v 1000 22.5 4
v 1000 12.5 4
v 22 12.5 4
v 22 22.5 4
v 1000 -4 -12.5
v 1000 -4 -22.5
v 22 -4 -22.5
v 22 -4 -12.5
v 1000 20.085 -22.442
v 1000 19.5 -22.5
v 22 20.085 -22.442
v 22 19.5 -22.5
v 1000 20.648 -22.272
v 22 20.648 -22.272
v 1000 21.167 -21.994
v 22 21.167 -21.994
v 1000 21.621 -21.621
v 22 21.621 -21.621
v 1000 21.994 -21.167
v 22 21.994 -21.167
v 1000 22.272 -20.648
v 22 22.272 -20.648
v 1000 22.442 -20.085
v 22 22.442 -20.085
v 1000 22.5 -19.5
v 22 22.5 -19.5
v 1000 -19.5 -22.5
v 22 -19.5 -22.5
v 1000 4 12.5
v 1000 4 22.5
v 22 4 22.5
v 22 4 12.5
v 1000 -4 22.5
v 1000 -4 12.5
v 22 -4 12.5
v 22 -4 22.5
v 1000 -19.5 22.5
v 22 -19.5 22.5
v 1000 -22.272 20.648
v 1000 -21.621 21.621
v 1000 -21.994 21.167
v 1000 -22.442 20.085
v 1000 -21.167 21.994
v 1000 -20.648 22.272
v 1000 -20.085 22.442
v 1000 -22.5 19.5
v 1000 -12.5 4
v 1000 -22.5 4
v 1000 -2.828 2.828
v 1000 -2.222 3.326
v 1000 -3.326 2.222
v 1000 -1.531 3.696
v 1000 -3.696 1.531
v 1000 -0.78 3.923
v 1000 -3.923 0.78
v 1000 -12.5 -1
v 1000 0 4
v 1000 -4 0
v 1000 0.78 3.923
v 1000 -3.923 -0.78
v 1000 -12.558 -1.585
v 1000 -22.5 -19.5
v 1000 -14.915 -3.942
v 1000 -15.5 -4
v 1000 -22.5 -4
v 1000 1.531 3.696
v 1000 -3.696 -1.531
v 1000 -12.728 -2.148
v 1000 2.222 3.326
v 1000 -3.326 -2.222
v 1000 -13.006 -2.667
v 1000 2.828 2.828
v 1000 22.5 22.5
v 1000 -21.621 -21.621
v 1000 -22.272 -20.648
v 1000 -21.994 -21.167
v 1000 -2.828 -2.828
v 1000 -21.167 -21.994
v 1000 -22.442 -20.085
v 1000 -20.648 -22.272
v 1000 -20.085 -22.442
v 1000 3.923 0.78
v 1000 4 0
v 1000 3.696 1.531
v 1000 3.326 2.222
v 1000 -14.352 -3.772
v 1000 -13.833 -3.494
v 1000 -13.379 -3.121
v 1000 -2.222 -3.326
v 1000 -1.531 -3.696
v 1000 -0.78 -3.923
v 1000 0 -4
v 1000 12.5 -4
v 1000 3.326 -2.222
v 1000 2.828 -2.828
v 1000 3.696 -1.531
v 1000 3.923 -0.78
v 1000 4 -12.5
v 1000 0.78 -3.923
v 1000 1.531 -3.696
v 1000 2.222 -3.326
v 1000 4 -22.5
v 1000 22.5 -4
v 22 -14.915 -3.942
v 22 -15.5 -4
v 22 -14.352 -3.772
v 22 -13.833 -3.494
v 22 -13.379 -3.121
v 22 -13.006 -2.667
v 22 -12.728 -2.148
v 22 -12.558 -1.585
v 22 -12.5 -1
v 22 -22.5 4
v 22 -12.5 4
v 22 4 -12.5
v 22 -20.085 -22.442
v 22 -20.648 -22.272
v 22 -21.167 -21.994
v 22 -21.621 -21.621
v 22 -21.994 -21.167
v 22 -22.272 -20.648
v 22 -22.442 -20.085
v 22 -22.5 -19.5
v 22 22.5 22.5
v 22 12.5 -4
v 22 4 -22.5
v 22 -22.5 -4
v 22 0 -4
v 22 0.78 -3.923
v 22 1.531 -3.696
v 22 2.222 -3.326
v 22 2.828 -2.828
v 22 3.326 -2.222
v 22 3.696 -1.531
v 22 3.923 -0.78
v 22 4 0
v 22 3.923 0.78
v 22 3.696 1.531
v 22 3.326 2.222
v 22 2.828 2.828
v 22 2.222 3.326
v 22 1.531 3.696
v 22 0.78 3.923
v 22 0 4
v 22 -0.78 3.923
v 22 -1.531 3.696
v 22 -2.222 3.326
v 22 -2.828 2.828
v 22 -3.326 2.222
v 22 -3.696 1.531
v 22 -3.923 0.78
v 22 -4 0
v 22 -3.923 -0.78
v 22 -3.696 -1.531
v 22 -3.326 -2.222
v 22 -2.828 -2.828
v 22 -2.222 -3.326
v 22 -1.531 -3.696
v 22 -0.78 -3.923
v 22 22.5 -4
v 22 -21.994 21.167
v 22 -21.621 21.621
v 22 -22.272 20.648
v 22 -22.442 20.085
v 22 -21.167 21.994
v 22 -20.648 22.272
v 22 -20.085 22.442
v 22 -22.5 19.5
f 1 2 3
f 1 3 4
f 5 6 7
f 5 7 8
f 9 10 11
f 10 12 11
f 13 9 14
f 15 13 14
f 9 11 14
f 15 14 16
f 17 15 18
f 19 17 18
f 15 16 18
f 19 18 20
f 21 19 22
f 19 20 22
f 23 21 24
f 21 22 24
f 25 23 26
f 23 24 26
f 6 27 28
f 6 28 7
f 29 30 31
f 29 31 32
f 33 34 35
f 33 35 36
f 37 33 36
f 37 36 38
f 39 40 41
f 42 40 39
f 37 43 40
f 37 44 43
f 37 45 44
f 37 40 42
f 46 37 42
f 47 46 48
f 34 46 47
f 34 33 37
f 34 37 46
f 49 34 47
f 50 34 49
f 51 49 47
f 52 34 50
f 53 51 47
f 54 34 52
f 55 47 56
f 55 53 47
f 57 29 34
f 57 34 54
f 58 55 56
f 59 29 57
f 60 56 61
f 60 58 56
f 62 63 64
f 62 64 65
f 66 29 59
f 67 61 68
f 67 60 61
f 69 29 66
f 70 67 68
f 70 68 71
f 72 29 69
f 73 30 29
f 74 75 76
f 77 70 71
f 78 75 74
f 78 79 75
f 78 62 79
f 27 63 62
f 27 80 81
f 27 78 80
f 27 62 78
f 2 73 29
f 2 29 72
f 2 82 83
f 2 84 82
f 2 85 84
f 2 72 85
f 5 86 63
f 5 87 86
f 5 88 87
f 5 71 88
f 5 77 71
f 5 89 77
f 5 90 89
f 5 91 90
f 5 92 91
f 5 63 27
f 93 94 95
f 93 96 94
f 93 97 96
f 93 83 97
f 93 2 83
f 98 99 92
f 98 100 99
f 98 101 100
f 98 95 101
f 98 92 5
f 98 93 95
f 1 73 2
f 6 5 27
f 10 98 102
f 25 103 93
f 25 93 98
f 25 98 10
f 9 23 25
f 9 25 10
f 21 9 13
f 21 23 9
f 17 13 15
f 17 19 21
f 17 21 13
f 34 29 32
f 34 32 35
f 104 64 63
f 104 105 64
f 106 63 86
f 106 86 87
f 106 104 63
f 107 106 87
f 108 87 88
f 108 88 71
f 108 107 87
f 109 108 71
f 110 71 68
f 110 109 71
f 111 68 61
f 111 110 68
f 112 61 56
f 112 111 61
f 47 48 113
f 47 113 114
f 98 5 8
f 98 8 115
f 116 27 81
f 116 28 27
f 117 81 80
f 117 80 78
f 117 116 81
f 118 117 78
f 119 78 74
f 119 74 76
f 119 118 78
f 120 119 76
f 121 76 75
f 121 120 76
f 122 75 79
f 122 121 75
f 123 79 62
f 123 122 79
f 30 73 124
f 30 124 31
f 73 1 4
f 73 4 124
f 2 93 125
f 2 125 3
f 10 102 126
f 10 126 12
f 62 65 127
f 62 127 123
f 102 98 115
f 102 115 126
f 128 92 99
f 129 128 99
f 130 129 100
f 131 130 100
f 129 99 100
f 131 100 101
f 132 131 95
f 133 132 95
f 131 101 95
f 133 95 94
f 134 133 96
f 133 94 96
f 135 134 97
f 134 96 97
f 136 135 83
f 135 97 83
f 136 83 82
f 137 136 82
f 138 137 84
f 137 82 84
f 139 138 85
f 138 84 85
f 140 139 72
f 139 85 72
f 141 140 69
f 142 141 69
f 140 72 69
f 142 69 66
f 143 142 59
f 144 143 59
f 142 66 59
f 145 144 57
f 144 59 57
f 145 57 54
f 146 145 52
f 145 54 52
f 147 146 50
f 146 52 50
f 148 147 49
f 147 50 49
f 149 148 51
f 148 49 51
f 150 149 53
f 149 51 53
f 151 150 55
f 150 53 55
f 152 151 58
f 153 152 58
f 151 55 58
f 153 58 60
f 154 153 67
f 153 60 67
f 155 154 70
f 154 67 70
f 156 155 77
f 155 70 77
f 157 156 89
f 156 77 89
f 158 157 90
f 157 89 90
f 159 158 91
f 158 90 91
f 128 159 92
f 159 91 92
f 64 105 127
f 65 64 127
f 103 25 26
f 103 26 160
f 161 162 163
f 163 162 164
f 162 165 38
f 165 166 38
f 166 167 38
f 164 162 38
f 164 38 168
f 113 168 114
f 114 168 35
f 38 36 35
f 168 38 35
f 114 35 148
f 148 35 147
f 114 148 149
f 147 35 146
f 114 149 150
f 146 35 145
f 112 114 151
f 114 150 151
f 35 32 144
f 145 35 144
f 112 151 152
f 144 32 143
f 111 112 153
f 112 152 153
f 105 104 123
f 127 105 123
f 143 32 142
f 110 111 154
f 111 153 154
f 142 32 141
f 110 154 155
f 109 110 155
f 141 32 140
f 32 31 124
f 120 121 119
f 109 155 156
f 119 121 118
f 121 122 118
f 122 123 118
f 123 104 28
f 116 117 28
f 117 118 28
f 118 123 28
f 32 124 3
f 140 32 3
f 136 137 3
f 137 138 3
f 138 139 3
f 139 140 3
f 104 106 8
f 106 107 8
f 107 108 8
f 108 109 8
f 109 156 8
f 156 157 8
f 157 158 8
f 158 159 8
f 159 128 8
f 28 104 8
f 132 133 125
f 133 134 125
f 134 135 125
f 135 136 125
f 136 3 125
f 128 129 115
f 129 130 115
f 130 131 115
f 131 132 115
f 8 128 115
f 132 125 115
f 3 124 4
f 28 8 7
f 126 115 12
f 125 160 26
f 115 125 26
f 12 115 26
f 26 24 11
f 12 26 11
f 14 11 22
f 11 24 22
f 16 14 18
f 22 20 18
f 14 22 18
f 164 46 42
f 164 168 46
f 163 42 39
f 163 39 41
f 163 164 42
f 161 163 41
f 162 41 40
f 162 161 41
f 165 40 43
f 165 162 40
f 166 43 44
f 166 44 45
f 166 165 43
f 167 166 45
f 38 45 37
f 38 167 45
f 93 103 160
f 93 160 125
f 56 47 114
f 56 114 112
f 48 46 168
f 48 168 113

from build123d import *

# Parameters (mm, degrees)
ESQUISSE1_R        = 4
BOSS_EXTRU_1_DEPTH = 978
CONG_1_R           = 3


with BuildPart() as part:
    # Esquisse1 → Boss.-Extru.1 (new body)
    with BuildSketch(Plane(origin=(1000, 0, 0), x_dir=(0, 0, -1), z_dir=(1, 0, 0))):
        Polygon((22.5, -4), (12.5, -4), (12.5, 4), (22.5, 4), (22.5, 22.5), (4, 22.5), (4, 12.5), (-4, 12.5), (-4, 22.5), (-22.5, 22.5), (-22.5, 4), (-12.5, 4), (-12.5, -4), (-22.5, -4), (-22.5, -22.5), (-4, -22.5), (-4, -12.5), (4, -12.5), (4, -22.5), (22.5, -22.5), align=None)
        Circle(ESQUISSE1_R, mode=Mode.SUBTRACT)
    extrude(amount=-BOSS_EXTRU_1_DEPTH)

    # Congé1
    cong_1_edges = [part.edges().sort_by_distance(p)[0] for p in [
        (511, -22.5, -22.5),
        (511, -12.5, -4),
        (511, -22.5, 22.5),
        (511, 22.5, -22.5),
    ]]
    fillet(cong_1_edges, radius=CONG_1_R)


solid = part.part
